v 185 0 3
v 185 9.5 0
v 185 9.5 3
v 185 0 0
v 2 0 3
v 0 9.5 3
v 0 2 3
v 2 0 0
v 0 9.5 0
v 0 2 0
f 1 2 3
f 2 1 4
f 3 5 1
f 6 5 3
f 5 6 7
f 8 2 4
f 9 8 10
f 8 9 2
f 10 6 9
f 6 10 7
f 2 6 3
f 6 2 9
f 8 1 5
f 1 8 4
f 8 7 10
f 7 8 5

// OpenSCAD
length = 185;
width = 19/2;
height = 3;


difference(){
  cube([length, width, height]);
  linear_extrude(height){
    // small cutout to compensate for rounded edges
    polygon(points=[[0,0],[2,0],[0,2]],paths=[[0,1,2]]);
  }
}
